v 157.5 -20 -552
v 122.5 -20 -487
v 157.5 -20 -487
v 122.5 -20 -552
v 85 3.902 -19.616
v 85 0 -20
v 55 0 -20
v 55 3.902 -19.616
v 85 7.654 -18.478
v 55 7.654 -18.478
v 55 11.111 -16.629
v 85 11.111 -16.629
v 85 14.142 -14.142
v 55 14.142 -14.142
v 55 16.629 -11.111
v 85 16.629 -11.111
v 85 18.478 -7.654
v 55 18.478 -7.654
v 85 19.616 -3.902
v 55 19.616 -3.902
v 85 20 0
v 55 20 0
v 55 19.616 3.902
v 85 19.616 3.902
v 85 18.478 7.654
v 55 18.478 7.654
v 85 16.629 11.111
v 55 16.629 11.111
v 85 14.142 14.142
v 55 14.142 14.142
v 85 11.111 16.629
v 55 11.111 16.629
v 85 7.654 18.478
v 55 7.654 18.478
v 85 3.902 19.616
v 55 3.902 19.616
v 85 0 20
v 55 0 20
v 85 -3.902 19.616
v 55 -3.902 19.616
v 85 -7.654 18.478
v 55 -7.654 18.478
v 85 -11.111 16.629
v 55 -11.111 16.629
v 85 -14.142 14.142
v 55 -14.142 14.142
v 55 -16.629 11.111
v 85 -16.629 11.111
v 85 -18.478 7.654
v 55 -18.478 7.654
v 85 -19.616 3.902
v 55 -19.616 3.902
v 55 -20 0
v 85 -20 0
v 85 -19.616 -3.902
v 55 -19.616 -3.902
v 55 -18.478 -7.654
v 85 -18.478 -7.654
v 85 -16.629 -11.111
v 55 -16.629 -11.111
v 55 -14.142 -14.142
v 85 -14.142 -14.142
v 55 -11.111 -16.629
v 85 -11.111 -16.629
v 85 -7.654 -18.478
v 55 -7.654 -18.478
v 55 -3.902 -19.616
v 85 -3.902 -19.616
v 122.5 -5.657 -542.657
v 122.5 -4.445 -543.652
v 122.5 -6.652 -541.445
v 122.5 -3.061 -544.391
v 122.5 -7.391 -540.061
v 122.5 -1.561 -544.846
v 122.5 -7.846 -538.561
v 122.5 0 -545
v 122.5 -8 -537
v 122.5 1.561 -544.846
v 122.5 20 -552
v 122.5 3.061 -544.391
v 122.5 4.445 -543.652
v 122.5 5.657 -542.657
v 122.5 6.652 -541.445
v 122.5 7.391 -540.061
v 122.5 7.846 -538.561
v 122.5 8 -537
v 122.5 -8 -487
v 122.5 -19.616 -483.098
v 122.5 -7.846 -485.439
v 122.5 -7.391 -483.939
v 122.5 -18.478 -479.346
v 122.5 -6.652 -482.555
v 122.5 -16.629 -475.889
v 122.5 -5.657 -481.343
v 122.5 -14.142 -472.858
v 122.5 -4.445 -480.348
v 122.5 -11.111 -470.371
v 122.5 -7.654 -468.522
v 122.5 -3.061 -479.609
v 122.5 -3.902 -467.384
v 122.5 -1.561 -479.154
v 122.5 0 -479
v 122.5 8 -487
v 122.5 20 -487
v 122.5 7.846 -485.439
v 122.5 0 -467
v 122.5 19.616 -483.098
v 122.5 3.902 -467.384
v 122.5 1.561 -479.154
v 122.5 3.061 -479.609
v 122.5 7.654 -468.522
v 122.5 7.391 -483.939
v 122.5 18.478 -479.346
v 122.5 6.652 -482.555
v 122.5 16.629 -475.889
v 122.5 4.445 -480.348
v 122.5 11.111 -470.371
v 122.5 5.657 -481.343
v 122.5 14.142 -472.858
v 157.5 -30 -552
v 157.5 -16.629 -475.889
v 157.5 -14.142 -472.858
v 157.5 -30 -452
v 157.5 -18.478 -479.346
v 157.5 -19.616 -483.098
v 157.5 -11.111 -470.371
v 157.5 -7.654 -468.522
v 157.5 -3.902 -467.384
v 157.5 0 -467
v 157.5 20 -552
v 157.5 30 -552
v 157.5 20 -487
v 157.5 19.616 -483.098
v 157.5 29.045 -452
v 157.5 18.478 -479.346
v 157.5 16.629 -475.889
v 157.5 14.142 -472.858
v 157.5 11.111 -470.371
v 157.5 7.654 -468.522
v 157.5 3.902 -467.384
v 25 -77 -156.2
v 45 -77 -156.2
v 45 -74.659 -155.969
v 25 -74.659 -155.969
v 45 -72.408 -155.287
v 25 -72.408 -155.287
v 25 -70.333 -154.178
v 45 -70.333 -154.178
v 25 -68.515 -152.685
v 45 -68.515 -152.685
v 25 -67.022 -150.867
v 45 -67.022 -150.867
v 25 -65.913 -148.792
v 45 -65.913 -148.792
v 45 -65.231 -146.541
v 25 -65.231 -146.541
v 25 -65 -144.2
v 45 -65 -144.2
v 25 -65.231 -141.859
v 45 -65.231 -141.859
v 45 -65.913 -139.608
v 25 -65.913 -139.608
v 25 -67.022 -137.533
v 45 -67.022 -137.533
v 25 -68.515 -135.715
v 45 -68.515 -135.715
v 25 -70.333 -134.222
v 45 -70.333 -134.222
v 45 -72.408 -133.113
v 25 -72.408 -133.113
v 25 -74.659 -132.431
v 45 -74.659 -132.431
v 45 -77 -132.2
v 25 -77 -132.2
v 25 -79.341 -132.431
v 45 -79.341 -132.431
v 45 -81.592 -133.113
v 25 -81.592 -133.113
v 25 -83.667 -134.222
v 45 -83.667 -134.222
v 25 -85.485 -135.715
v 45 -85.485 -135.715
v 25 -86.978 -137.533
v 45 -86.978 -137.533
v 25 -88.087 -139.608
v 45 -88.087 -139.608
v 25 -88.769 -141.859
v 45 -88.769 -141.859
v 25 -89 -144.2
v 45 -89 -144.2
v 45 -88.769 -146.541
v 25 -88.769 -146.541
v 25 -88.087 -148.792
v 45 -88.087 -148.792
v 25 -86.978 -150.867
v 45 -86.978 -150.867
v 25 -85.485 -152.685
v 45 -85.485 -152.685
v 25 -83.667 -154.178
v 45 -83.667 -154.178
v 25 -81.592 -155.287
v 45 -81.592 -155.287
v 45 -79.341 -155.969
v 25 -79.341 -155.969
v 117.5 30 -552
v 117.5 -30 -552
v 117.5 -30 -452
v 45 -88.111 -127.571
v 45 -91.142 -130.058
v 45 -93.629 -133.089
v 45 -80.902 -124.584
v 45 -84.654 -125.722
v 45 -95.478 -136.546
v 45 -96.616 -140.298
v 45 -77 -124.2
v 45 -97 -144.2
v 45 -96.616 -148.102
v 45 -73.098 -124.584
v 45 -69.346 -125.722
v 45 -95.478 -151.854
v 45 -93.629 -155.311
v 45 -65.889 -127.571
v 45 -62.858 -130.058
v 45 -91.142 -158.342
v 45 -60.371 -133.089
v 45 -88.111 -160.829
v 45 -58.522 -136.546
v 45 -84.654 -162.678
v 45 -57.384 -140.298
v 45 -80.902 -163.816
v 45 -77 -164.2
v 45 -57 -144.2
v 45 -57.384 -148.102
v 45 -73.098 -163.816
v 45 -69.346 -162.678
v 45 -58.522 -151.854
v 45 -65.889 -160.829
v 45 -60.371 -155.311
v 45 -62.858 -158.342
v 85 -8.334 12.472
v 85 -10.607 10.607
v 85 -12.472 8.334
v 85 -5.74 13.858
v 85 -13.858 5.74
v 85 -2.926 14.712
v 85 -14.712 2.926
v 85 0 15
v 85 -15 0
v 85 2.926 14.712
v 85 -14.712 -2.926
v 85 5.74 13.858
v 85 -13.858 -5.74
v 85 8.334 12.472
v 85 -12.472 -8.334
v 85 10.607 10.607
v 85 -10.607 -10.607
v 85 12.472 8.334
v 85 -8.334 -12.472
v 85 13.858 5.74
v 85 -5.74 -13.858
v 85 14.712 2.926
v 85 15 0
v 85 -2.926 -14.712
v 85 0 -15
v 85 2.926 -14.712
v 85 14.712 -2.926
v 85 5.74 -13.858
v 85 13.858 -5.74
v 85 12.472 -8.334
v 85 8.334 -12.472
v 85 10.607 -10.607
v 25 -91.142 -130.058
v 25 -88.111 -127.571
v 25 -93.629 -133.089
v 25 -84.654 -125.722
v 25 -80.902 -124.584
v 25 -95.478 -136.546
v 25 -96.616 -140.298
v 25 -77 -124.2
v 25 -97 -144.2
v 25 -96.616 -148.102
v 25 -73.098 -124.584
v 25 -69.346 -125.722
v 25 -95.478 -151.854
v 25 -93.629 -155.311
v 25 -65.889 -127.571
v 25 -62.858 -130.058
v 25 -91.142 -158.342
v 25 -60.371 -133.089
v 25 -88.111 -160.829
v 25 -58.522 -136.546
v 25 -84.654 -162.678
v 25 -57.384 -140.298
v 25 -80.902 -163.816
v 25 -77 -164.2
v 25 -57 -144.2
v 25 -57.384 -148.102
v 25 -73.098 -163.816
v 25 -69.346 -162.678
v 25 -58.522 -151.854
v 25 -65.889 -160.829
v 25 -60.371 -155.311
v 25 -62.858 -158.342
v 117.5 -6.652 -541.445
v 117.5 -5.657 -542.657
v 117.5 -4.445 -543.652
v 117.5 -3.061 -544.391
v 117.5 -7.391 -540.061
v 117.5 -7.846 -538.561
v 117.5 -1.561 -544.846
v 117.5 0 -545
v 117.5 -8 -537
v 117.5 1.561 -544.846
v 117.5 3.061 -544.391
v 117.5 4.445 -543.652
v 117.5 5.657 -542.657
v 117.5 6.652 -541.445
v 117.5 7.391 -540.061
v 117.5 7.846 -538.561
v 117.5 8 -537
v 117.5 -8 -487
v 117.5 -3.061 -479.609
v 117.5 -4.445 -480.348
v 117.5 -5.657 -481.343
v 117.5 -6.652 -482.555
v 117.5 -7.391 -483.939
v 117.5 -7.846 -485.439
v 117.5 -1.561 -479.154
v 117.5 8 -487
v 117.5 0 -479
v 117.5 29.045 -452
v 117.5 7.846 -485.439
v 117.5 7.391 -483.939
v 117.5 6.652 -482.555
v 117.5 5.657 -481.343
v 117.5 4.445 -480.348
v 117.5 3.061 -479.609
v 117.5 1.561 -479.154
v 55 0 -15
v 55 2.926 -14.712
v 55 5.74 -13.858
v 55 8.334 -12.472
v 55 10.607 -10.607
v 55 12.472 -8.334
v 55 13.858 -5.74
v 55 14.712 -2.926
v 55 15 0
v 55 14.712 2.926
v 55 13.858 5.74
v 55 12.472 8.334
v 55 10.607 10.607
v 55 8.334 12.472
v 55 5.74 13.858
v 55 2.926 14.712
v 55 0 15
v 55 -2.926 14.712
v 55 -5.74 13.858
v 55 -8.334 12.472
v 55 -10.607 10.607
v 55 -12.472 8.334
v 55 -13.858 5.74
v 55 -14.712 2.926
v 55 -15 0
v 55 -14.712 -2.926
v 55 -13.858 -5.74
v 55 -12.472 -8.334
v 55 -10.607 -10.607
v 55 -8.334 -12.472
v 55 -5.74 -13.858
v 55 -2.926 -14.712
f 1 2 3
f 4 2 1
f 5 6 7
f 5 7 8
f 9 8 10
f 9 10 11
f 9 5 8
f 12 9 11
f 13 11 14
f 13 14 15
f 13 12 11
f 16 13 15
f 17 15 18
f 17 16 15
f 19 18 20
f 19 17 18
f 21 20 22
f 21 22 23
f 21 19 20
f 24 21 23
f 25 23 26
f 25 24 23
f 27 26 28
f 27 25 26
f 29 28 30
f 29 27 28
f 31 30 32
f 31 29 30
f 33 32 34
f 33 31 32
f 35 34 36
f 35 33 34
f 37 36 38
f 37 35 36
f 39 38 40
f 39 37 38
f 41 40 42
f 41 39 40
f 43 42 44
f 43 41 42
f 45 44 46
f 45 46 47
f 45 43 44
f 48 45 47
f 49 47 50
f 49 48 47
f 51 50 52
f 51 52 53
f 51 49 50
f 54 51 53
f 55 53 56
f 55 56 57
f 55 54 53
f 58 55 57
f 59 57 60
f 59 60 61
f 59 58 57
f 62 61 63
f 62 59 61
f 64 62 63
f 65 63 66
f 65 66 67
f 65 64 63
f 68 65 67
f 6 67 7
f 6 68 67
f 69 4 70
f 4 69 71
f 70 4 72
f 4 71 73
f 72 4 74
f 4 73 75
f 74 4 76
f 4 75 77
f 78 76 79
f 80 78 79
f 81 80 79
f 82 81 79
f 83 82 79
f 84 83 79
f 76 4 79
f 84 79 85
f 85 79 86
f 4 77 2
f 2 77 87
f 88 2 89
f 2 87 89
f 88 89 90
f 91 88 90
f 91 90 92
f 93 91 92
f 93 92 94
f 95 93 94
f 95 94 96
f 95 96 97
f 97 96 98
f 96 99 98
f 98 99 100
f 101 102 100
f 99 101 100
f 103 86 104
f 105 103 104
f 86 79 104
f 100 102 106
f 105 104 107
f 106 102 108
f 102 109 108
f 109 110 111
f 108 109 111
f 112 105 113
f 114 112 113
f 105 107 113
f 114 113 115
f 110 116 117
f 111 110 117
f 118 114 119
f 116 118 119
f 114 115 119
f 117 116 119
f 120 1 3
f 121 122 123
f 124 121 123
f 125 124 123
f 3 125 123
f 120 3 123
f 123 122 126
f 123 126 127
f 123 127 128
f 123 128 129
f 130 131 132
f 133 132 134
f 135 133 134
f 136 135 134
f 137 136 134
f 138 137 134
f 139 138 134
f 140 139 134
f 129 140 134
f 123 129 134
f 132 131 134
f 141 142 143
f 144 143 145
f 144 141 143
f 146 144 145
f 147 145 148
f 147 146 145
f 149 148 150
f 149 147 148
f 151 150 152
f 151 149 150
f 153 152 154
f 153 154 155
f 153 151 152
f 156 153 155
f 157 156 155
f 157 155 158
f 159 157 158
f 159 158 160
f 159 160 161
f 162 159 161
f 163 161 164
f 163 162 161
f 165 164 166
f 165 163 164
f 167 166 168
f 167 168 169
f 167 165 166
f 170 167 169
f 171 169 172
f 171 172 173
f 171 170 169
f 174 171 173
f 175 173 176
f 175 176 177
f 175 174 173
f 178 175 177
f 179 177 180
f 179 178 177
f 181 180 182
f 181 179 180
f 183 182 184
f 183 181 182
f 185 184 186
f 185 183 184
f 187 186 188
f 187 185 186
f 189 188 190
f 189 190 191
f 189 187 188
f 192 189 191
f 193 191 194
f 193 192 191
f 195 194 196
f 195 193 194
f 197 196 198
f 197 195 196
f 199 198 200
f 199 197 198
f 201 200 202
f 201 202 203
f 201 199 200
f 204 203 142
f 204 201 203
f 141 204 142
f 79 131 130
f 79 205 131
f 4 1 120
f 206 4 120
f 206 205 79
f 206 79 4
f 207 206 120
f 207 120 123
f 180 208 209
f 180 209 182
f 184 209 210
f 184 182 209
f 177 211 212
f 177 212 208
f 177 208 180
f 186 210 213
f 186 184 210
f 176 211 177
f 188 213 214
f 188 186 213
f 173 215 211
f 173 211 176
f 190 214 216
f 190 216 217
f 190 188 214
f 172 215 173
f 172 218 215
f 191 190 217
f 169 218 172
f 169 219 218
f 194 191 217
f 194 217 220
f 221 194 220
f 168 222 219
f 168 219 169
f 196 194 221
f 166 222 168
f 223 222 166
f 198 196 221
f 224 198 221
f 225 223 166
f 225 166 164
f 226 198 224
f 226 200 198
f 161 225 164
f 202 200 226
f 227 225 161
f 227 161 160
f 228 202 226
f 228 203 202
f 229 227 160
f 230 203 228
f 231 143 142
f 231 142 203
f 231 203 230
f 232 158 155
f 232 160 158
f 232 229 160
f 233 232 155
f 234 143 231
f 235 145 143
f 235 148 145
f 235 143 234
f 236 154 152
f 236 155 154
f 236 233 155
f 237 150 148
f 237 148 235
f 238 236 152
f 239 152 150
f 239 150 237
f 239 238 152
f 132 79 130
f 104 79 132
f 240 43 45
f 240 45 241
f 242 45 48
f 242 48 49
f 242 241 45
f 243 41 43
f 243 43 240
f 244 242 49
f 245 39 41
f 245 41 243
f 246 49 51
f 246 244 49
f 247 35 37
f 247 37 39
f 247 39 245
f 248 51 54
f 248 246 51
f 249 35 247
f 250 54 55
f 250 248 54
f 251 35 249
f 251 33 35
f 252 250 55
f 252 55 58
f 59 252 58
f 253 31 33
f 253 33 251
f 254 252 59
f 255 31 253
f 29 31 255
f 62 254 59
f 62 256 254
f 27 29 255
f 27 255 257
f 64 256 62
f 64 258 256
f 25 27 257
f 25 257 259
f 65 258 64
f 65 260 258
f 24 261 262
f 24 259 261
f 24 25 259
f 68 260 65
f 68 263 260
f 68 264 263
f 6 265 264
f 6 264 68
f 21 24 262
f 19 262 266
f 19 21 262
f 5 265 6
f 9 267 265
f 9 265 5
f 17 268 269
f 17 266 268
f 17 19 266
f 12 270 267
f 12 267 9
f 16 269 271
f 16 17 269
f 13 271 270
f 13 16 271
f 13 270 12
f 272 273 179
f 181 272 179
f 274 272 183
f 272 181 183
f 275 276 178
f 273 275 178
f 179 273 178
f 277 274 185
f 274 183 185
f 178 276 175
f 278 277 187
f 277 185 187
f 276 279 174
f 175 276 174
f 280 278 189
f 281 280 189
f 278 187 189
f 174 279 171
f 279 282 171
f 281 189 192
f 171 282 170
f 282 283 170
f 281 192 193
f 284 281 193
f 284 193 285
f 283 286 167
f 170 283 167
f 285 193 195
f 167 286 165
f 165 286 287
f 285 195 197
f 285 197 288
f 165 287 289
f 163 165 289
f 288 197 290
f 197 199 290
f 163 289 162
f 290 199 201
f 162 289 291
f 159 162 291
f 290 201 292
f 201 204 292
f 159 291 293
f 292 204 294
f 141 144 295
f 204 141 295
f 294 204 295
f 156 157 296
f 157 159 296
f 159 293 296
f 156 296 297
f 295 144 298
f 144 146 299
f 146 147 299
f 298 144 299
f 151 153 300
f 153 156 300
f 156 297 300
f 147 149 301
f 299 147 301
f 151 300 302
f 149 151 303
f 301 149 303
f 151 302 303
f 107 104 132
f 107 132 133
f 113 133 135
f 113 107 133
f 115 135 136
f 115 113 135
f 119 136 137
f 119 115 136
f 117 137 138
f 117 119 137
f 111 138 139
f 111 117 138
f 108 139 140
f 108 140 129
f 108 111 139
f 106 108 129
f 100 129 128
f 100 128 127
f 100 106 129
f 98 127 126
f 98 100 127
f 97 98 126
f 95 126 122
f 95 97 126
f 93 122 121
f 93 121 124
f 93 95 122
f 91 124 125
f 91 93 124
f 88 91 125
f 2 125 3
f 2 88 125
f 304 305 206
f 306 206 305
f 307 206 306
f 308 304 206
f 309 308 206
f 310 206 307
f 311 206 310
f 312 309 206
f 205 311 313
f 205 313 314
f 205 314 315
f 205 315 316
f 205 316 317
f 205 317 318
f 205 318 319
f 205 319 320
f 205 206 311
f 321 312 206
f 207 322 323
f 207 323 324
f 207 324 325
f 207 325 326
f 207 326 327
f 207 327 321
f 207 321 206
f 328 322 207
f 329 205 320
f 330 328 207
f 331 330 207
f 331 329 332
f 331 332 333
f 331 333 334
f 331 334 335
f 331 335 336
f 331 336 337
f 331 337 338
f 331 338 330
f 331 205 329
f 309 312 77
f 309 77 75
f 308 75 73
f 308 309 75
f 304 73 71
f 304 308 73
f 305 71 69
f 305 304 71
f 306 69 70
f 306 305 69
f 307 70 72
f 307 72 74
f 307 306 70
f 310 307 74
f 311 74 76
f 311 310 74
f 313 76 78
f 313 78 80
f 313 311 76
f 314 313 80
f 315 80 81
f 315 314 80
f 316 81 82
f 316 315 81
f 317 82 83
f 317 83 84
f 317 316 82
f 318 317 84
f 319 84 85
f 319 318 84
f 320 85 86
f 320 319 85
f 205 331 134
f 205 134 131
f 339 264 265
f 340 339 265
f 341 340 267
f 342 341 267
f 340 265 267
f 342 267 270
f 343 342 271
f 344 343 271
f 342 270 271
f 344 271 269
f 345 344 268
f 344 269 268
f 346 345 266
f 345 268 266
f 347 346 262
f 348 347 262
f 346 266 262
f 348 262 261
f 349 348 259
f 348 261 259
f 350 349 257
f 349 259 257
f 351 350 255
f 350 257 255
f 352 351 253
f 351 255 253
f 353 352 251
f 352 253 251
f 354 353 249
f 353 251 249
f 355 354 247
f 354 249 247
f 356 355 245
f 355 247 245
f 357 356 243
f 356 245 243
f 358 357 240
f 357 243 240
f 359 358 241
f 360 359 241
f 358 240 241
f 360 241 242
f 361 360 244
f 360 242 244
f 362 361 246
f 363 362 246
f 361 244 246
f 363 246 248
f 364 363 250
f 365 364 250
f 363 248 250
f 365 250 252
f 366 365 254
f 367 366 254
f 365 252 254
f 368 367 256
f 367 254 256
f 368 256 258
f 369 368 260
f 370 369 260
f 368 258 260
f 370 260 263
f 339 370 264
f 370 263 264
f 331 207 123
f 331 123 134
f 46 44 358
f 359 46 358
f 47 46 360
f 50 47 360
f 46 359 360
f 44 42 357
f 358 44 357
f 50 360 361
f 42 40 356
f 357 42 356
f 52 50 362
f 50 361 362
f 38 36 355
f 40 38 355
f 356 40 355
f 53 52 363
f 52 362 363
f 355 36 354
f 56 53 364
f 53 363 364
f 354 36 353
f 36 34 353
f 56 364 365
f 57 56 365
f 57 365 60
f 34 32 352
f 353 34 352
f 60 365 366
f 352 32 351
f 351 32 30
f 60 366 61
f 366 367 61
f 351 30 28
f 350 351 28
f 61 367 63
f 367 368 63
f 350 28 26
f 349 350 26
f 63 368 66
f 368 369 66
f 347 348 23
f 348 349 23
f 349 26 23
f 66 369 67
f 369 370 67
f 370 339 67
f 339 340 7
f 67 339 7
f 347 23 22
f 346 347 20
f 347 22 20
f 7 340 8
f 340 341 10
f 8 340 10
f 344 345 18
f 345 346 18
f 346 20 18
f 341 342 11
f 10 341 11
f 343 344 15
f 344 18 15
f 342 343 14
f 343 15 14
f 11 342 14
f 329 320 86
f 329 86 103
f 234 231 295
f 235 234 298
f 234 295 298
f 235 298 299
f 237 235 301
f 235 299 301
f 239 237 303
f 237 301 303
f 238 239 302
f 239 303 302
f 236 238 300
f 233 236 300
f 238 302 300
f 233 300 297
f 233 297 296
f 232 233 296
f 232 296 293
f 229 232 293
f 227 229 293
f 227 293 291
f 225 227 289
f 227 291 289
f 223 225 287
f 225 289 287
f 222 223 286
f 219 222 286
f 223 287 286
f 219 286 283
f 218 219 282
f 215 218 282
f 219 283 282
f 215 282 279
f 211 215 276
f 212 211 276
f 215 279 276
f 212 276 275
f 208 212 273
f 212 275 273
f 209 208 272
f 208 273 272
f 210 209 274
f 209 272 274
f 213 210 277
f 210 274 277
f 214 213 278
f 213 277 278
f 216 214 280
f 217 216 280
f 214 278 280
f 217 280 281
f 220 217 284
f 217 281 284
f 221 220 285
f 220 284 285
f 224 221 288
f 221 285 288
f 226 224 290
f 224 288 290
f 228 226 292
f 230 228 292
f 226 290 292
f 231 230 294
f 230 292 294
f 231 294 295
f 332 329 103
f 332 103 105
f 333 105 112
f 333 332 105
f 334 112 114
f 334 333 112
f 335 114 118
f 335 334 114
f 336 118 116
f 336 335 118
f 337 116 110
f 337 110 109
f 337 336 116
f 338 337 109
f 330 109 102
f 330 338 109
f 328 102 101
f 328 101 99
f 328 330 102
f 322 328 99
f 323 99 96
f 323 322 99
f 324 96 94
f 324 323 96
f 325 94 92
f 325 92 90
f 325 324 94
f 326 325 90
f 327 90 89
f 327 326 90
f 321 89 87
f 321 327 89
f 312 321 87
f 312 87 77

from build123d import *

# Parameters (mm, degrees)
TYLNE_START              = -7.5
TYLNE_KO_O_DEPTH         = 5
TYLENE_START             = -2.5
TYLENE_KO_O_2_DEPTH      = 35
RAMA_START               = -50
SZKIC_INSERT_RAMA_R      = 20
SZKIC_INSERT_RAMA_R_2    = 15
RAMA_DEPTH               = 30
LINKAGE_START            = 25
SZKIC_INSERT_LINKAGE_R   = 20
SZKIC_INSERT_LINKAGE_R_2 = 12
LINKAGE_DEPTH            = 20


with BuildPart() as part:
    # Szkic - insert - tylne koło → Tylne koło (new body)
    with BuildSketch(Plane(origin=(125, 0, 0), x_dir=(0, 0, -1), z_dir=(1, 0, 0)).offset(TYLNE_START)):
        with BuildLine():
            ThreePointArc((487, 20), (467, 0), (487, -20))
            Line((487, -20), (552, -20))
            Line((552, -20), (552, -30))
            Line((552, -30), (452, -30))
            Line((452, -30), (452, 29.044549731))
            Line((452, 29.044549731), (552, 30))
            Line((552, 30), (552, 20))
            Line((552, 20), (487, 20))
        make_face()
        with BuildLine():
            Line((487, 20), (552, 20))
            Line((552, 20), (552, -20))
            Line((552, -20), (487, -20))
            ThreePointArc((487, -20), (467, 0), (487, 20))
        make_face()
        with BuildLine():
            ThreePointArc((537, -8), (545, 0), (537, 8))
            Line((537, 8), (487, 8))
            ThreePointArc((487, 8), (479, 0), (487, -8))
            Line((487, -8), (537, -8))
        make_face(mode=Mode.SUBTRACT)
    extrude(amount=TYLNE_KO_O_DEPTH)

    # Szkic - insert - tylne koło<6> → Tylene koło 2 (add)
    with BuildSketch(Plane(origin=(125, 0, 0), x_dir=(0, 0, -1), z_dir=(1, 0, 0)).offset(TYLENE_START)):
        with BuildLine():
            ThreePointArc((487, 20), (467, 0), (487, -20))
            Line((487, -20), (552, -20))
            Line((552, -20), (552, -30))
            Line((552, -30), (452, -30))
            Line((452, -30), (452, 29.044549731))
            Line((452, 29.044549731), (552, 30))
            Line((552, 30), (552, 20))
            Line((552, 20), (487, 20))
        make_face()
    extrude(amount=TYLENE_KO_O_2_DEPTH)


with BuildPart() as body_2:
    # Szkic - insert - rama → Rama (new body)
    with BuildSketch(Plane(origin=(135, 0, 0), x_dir=(0, 0, -1), z_dir=(1, 0, 0)).offset(RAMA_START)):
        Circle(SZKIC_INSERT_RAMA_R)
        Circle(SZKIC_INSERT_RAMA_R_2, mode=Mode.SUBTRACT)
    extrude(amount=-RAMA_DEPTH)


with BuildPart() as body_3:
    # Szkic - insert - linkage → Linkage (new body)
    with BuildSketch(Plane(origin=(0, 0, 0), x_dir=(0, 0, -1), z_dir=(1, 0, 0)).offset(LINKAGE_START)):
        with Locations((144.2, -77)):
            Circle(SZKIC_INSERT_LINKAGE_R)
        with Locations((144.2, -77)):
            Circle(SZKIC_INSERT_LINKAGE_R_2, mode=Mode.SUBTRACT)
    extrude(amount=LINKAGE_DEPTH)


solid = Compound([part.part, body_2.part, body_3.part])
